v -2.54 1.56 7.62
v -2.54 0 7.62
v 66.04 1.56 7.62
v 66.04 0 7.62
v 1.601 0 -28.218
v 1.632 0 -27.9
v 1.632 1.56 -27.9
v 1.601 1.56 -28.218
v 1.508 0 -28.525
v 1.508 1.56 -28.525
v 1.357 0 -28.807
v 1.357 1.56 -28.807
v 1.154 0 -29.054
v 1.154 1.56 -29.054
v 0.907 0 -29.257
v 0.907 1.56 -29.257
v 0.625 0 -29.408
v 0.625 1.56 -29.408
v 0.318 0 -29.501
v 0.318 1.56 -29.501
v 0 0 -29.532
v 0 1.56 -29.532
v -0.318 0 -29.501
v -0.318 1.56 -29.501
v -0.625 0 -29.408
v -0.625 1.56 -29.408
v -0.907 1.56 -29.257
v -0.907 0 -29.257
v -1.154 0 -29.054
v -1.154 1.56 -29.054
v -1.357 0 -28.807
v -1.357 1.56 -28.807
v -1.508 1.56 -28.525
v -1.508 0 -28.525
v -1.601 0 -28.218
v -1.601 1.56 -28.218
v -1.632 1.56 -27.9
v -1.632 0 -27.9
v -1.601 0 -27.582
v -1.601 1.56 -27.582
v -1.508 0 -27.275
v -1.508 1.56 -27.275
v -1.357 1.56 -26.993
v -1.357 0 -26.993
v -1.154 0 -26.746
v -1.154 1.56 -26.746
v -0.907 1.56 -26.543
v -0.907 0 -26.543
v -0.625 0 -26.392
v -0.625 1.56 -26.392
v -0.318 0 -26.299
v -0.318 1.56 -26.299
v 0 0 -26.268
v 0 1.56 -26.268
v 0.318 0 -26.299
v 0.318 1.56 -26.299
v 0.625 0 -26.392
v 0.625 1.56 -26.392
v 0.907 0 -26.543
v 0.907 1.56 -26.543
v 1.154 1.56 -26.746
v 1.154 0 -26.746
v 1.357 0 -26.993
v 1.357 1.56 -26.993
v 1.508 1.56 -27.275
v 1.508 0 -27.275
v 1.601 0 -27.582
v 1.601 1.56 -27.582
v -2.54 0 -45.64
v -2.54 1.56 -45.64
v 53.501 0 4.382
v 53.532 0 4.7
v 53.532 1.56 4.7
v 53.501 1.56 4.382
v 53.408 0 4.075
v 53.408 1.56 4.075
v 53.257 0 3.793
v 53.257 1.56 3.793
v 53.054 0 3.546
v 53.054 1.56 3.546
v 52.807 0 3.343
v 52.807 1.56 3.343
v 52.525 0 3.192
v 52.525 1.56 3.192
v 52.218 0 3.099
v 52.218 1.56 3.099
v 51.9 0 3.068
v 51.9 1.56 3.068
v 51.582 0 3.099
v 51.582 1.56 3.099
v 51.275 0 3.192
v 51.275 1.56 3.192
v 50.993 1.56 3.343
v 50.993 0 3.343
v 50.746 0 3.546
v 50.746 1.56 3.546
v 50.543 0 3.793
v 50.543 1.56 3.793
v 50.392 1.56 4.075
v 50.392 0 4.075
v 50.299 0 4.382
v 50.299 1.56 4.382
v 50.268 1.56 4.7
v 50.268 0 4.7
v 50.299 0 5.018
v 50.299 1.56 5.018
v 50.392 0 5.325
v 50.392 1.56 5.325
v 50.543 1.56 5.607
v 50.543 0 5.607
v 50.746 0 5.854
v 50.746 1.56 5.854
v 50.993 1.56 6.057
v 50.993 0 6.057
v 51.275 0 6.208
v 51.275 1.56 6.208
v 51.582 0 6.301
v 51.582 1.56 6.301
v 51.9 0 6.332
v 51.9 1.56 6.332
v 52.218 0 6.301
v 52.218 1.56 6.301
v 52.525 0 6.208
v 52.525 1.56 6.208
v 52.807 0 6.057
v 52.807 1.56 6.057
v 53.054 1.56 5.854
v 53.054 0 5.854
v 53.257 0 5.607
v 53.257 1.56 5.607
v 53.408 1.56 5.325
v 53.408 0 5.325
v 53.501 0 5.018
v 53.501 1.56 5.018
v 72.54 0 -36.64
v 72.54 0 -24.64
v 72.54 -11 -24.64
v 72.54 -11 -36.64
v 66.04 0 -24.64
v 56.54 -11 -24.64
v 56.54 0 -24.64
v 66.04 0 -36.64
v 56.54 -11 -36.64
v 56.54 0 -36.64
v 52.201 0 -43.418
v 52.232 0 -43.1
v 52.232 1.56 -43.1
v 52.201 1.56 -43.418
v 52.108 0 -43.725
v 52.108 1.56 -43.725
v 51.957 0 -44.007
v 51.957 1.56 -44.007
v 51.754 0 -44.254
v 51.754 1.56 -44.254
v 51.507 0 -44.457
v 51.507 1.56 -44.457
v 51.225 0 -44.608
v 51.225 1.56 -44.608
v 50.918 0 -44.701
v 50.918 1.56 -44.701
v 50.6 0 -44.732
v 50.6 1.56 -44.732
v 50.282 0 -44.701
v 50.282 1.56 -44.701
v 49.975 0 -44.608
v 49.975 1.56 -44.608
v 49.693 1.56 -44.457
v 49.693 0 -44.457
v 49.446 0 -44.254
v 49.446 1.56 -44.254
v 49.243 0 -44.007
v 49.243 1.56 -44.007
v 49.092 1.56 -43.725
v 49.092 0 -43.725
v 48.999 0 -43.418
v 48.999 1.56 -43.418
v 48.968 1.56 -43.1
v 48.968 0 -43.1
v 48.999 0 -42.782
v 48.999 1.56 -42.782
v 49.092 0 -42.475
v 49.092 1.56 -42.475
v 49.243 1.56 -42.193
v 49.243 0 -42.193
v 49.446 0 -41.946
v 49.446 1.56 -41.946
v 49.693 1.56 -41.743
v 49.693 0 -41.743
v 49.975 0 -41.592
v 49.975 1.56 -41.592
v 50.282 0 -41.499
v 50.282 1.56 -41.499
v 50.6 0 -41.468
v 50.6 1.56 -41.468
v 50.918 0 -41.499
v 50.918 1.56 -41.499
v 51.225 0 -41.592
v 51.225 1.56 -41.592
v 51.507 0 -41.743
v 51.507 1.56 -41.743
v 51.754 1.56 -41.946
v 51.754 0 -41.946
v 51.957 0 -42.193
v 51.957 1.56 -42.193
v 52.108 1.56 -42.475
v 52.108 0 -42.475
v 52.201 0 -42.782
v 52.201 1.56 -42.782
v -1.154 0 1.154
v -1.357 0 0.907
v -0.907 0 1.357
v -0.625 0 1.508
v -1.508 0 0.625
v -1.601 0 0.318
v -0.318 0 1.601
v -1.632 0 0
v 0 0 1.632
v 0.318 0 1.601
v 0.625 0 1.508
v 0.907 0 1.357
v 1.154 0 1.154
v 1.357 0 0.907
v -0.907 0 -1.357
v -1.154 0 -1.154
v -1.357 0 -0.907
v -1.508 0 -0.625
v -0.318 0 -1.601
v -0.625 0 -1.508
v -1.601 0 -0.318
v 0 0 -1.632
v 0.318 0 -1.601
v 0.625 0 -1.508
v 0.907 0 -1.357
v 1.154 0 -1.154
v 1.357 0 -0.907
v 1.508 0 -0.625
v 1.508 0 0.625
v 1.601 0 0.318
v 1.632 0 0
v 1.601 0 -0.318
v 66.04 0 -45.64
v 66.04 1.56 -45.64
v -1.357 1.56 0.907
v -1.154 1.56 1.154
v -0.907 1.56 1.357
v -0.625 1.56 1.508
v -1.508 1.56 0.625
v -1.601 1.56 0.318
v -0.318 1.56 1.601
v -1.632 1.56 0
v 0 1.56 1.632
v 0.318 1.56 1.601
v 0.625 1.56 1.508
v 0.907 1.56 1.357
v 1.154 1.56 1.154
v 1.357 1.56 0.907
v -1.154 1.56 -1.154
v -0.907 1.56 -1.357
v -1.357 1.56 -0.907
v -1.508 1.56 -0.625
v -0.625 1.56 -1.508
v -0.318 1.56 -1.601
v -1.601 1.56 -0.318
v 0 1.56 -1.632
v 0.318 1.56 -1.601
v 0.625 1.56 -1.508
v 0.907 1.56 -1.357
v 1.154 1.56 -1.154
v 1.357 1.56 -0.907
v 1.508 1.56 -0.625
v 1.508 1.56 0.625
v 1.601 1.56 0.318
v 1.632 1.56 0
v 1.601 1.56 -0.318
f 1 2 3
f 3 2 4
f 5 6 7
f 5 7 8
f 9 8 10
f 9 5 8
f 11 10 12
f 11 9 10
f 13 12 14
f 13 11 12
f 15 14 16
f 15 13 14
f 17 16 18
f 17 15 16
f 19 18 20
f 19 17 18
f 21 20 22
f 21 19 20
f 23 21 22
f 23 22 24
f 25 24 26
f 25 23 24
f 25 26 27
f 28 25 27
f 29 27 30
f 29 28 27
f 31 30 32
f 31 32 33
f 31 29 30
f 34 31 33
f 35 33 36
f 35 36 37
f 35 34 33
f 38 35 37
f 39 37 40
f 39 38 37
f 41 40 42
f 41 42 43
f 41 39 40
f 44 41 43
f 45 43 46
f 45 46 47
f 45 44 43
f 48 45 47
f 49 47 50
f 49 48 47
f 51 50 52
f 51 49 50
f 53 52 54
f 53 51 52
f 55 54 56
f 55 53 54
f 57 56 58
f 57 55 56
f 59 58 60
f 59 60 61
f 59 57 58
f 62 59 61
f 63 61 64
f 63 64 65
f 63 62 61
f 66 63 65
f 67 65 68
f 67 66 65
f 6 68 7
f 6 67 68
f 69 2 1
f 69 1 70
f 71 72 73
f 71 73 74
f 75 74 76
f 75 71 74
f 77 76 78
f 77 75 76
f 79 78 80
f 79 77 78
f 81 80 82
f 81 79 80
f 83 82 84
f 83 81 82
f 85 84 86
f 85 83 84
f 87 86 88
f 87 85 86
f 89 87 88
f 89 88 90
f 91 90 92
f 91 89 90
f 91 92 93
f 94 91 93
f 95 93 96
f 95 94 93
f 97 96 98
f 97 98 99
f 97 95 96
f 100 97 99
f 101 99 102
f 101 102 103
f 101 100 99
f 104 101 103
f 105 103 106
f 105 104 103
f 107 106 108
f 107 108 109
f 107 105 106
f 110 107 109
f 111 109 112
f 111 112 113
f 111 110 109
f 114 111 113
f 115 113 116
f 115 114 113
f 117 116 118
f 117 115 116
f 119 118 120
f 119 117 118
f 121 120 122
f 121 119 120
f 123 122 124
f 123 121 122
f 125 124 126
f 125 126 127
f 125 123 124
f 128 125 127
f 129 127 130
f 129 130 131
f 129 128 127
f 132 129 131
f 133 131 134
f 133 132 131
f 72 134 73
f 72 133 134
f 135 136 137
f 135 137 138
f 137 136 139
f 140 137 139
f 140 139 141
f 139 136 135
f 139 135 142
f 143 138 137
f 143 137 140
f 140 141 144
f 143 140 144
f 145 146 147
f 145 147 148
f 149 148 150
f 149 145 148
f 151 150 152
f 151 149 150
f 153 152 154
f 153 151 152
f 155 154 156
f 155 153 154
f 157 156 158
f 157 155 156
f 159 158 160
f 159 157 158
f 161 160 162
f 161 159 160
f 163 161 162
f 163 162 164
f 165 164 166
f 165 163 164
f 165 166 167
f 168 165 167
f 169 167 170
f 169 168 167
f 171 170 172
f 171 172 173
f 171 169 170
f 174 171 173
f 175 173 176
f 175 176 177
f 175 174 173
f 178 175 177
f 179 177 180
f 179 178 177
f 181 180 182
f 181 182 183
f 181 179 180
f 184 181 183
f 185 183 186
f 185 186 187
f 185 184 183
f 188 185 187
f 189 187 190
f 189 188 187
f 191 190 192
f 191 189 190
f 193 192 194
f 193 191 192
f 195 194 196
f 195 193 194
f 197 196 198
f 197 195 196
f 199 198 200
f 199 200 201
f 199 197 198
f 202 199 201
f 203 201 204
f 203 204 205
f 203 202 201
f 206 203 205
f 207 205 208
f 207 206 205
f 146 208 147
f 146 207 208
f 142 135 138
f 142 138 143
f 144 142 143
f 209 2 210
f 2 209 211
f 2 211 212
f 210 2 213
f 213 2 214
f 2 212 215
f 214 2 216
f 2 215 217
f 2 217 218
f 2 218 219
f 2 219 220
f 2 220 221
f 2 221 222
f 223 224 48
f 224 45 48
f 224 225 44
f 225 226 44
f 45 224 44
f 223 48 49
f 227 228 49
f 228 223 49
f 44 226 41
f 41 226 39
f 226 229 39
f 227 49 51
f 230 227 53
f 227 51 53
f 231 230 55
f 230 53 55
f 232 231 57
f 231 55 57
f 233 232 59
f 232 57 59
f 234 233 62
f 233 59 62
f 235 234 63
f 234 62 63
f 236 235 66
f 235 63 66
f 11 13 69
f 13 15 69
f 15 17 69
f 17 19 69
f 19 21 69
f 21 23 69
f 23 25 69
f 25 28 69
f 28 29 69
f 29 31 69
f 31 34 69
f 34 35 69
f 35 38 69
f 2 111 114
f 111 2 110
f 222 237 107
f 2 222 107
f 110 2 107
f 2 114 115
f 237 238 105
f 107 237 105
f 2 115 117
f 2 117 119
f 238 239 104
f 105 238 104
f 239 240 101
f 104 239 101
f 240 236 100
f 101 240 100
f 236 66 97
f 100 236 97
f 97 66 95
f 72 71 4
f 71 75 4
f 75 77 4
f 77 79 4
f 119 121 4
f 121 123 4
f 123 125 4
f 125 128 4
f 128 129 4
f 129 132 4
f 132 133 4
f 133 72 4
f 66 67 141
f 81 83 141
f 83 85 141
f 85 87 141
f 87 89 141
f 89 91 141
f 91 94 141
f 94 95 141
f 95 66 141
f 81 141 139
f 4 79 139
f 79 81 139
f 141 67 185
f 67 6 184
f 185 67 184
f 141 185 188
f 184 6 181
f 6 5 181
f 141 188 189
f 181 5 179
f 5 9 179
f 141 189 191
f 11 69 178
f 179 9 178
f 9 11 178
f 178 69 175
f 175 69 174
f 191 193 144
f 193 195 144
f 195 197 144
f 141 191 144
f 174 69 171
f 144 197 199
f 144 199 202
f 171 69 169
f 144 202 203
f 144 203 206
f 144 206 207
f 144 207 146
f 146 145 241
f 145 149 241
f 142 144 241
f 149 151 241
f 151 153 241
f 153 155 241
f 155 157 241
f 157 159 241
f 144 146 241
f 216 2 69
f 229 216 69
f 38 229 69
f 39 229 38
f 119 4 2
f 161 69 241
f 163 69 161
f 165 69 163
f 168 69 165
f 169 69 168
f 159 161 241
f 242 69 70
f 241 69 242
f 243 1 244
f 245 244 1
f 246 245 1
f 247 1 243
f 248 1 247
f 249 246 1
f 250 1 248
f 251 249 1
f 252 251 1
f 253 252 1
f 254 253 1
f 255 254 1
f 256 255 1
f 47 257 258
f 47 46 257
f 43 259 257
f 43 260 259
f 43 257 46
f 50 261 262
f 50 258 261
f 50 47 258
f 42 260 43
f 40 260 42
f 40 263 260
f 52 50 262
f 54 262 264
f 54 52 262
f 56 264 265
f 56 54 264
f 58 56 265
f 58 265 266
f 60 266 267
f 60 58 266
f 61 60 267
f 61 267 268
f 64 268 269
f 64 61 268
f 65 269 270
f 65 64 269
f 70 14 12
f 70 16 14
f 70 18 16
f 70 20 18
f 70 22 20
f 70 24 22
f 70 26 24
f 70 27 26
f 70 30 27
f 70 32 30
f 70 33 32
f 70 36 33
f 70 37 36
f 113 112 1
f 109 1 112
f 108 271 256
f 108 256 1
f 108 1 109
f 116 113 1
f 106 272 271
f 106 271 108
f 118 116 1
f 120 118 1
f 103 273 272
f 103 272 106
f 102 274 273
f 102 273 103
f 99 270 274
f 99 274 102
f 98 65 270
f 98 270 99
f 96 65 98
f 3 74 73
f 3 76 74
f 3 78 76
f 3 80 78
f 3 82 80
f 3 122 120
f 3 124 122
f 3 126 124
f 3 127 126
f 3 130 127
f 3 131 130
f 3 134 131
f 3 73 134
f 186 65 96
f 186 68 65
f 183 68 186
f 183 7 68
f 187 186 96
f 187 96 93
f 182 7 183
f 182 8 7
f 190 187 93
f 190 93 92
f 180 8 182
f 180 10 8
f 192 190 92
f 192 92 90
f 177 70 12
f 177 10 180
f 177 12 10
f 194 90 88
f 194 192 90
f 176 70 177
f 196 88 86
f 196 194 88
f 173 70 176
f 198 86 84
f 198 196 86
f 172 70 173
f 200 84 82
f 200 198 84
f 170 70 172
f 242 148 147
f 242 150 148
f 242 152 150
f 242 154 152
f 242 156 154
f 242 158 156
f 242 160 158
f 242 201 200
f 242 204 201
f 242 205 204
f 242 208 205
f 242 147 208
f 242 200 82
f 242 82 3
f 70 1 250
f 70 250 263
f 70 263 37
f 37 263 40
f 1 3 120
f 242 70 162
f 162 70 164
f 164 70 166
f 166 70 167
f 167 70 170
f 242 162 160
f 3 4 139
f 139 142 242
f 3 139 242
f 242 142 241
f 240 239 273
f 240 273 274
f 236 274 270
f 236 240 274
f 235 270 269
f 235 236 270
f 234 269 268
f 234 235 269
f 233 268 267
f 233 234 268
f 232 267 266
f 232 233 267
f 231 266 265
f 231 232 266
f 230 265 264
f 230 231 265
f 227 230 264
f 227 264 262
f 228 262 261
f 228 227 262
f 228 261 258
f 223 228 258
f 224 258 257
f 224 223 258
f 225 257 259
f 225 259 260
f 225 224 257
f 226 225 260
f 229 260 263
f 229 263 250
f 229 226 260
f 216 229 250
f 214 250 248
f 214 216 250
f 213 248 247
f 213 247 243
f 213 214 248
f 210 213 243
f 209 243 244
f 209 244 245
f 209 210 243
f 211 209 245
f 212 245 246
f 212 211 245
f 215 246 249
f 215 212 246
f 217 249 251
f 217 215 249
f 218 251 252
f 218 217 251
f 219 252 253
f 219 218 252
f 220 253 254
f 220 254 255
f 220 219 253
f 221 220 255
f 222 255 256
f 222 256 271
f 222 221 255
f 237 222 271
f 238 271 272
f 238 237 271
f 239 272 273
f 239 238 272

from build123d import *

# Parameters (mm, degrees)
SKETCH1_W           = 68.58
SKETCH1_H           = 53.26
SKETCH1_R           = 1.63195
BOSS_EXTRUDE1_DEPTH = 1.56
SKETCH2_W           = 16
SKETCH2_H           = 12
BOSS_EXTRUDE2_DEPTH = 11


with BuildPart() as part:
    # Sketch1 → Boss-Extrude1 (new body)
    with BuildSketch(Plane(origin=(0, 0, 0), x_dir=(1, 0, 0), z_dir=(0, 1, 0))):
        with Locations((31.75, 19.01)):
            Rectangle(SKETCH1_W, SKETCH1_H)
        Circle(SKETCH1_R, mode=Mode.SUBTRACT)
        with Locations((0, 27.9)):
            Circle(SKETCH1_R, mode=Mode.SUBTRACT)
        with Locations((51.9, -4.7)):
            Circle(SKETCH1_R, mode=Mode.SUBTRACT)
        with Locations((50.6, 43.1)):
            Circle(SKETCH1_R, mode=Mode.SUBTRACT)
    extrude(amount=BOSS_EXTRUDE1_DEPTH)

    # Sketch2 → Boss-Extrude2 (add)
    with BuildSketch(Plane(origin=(0, 0, 0), x_dir=(-1, 0, 0), z_dir=(0, -1, 0))):
        with Locations((-64.54, 30.64)):
            Rectangle(SKETCH2_W, SKETCH2_H)
    extrude(amount=BOSS_EXTRUDE2_DEPTH)


solid = part.part
